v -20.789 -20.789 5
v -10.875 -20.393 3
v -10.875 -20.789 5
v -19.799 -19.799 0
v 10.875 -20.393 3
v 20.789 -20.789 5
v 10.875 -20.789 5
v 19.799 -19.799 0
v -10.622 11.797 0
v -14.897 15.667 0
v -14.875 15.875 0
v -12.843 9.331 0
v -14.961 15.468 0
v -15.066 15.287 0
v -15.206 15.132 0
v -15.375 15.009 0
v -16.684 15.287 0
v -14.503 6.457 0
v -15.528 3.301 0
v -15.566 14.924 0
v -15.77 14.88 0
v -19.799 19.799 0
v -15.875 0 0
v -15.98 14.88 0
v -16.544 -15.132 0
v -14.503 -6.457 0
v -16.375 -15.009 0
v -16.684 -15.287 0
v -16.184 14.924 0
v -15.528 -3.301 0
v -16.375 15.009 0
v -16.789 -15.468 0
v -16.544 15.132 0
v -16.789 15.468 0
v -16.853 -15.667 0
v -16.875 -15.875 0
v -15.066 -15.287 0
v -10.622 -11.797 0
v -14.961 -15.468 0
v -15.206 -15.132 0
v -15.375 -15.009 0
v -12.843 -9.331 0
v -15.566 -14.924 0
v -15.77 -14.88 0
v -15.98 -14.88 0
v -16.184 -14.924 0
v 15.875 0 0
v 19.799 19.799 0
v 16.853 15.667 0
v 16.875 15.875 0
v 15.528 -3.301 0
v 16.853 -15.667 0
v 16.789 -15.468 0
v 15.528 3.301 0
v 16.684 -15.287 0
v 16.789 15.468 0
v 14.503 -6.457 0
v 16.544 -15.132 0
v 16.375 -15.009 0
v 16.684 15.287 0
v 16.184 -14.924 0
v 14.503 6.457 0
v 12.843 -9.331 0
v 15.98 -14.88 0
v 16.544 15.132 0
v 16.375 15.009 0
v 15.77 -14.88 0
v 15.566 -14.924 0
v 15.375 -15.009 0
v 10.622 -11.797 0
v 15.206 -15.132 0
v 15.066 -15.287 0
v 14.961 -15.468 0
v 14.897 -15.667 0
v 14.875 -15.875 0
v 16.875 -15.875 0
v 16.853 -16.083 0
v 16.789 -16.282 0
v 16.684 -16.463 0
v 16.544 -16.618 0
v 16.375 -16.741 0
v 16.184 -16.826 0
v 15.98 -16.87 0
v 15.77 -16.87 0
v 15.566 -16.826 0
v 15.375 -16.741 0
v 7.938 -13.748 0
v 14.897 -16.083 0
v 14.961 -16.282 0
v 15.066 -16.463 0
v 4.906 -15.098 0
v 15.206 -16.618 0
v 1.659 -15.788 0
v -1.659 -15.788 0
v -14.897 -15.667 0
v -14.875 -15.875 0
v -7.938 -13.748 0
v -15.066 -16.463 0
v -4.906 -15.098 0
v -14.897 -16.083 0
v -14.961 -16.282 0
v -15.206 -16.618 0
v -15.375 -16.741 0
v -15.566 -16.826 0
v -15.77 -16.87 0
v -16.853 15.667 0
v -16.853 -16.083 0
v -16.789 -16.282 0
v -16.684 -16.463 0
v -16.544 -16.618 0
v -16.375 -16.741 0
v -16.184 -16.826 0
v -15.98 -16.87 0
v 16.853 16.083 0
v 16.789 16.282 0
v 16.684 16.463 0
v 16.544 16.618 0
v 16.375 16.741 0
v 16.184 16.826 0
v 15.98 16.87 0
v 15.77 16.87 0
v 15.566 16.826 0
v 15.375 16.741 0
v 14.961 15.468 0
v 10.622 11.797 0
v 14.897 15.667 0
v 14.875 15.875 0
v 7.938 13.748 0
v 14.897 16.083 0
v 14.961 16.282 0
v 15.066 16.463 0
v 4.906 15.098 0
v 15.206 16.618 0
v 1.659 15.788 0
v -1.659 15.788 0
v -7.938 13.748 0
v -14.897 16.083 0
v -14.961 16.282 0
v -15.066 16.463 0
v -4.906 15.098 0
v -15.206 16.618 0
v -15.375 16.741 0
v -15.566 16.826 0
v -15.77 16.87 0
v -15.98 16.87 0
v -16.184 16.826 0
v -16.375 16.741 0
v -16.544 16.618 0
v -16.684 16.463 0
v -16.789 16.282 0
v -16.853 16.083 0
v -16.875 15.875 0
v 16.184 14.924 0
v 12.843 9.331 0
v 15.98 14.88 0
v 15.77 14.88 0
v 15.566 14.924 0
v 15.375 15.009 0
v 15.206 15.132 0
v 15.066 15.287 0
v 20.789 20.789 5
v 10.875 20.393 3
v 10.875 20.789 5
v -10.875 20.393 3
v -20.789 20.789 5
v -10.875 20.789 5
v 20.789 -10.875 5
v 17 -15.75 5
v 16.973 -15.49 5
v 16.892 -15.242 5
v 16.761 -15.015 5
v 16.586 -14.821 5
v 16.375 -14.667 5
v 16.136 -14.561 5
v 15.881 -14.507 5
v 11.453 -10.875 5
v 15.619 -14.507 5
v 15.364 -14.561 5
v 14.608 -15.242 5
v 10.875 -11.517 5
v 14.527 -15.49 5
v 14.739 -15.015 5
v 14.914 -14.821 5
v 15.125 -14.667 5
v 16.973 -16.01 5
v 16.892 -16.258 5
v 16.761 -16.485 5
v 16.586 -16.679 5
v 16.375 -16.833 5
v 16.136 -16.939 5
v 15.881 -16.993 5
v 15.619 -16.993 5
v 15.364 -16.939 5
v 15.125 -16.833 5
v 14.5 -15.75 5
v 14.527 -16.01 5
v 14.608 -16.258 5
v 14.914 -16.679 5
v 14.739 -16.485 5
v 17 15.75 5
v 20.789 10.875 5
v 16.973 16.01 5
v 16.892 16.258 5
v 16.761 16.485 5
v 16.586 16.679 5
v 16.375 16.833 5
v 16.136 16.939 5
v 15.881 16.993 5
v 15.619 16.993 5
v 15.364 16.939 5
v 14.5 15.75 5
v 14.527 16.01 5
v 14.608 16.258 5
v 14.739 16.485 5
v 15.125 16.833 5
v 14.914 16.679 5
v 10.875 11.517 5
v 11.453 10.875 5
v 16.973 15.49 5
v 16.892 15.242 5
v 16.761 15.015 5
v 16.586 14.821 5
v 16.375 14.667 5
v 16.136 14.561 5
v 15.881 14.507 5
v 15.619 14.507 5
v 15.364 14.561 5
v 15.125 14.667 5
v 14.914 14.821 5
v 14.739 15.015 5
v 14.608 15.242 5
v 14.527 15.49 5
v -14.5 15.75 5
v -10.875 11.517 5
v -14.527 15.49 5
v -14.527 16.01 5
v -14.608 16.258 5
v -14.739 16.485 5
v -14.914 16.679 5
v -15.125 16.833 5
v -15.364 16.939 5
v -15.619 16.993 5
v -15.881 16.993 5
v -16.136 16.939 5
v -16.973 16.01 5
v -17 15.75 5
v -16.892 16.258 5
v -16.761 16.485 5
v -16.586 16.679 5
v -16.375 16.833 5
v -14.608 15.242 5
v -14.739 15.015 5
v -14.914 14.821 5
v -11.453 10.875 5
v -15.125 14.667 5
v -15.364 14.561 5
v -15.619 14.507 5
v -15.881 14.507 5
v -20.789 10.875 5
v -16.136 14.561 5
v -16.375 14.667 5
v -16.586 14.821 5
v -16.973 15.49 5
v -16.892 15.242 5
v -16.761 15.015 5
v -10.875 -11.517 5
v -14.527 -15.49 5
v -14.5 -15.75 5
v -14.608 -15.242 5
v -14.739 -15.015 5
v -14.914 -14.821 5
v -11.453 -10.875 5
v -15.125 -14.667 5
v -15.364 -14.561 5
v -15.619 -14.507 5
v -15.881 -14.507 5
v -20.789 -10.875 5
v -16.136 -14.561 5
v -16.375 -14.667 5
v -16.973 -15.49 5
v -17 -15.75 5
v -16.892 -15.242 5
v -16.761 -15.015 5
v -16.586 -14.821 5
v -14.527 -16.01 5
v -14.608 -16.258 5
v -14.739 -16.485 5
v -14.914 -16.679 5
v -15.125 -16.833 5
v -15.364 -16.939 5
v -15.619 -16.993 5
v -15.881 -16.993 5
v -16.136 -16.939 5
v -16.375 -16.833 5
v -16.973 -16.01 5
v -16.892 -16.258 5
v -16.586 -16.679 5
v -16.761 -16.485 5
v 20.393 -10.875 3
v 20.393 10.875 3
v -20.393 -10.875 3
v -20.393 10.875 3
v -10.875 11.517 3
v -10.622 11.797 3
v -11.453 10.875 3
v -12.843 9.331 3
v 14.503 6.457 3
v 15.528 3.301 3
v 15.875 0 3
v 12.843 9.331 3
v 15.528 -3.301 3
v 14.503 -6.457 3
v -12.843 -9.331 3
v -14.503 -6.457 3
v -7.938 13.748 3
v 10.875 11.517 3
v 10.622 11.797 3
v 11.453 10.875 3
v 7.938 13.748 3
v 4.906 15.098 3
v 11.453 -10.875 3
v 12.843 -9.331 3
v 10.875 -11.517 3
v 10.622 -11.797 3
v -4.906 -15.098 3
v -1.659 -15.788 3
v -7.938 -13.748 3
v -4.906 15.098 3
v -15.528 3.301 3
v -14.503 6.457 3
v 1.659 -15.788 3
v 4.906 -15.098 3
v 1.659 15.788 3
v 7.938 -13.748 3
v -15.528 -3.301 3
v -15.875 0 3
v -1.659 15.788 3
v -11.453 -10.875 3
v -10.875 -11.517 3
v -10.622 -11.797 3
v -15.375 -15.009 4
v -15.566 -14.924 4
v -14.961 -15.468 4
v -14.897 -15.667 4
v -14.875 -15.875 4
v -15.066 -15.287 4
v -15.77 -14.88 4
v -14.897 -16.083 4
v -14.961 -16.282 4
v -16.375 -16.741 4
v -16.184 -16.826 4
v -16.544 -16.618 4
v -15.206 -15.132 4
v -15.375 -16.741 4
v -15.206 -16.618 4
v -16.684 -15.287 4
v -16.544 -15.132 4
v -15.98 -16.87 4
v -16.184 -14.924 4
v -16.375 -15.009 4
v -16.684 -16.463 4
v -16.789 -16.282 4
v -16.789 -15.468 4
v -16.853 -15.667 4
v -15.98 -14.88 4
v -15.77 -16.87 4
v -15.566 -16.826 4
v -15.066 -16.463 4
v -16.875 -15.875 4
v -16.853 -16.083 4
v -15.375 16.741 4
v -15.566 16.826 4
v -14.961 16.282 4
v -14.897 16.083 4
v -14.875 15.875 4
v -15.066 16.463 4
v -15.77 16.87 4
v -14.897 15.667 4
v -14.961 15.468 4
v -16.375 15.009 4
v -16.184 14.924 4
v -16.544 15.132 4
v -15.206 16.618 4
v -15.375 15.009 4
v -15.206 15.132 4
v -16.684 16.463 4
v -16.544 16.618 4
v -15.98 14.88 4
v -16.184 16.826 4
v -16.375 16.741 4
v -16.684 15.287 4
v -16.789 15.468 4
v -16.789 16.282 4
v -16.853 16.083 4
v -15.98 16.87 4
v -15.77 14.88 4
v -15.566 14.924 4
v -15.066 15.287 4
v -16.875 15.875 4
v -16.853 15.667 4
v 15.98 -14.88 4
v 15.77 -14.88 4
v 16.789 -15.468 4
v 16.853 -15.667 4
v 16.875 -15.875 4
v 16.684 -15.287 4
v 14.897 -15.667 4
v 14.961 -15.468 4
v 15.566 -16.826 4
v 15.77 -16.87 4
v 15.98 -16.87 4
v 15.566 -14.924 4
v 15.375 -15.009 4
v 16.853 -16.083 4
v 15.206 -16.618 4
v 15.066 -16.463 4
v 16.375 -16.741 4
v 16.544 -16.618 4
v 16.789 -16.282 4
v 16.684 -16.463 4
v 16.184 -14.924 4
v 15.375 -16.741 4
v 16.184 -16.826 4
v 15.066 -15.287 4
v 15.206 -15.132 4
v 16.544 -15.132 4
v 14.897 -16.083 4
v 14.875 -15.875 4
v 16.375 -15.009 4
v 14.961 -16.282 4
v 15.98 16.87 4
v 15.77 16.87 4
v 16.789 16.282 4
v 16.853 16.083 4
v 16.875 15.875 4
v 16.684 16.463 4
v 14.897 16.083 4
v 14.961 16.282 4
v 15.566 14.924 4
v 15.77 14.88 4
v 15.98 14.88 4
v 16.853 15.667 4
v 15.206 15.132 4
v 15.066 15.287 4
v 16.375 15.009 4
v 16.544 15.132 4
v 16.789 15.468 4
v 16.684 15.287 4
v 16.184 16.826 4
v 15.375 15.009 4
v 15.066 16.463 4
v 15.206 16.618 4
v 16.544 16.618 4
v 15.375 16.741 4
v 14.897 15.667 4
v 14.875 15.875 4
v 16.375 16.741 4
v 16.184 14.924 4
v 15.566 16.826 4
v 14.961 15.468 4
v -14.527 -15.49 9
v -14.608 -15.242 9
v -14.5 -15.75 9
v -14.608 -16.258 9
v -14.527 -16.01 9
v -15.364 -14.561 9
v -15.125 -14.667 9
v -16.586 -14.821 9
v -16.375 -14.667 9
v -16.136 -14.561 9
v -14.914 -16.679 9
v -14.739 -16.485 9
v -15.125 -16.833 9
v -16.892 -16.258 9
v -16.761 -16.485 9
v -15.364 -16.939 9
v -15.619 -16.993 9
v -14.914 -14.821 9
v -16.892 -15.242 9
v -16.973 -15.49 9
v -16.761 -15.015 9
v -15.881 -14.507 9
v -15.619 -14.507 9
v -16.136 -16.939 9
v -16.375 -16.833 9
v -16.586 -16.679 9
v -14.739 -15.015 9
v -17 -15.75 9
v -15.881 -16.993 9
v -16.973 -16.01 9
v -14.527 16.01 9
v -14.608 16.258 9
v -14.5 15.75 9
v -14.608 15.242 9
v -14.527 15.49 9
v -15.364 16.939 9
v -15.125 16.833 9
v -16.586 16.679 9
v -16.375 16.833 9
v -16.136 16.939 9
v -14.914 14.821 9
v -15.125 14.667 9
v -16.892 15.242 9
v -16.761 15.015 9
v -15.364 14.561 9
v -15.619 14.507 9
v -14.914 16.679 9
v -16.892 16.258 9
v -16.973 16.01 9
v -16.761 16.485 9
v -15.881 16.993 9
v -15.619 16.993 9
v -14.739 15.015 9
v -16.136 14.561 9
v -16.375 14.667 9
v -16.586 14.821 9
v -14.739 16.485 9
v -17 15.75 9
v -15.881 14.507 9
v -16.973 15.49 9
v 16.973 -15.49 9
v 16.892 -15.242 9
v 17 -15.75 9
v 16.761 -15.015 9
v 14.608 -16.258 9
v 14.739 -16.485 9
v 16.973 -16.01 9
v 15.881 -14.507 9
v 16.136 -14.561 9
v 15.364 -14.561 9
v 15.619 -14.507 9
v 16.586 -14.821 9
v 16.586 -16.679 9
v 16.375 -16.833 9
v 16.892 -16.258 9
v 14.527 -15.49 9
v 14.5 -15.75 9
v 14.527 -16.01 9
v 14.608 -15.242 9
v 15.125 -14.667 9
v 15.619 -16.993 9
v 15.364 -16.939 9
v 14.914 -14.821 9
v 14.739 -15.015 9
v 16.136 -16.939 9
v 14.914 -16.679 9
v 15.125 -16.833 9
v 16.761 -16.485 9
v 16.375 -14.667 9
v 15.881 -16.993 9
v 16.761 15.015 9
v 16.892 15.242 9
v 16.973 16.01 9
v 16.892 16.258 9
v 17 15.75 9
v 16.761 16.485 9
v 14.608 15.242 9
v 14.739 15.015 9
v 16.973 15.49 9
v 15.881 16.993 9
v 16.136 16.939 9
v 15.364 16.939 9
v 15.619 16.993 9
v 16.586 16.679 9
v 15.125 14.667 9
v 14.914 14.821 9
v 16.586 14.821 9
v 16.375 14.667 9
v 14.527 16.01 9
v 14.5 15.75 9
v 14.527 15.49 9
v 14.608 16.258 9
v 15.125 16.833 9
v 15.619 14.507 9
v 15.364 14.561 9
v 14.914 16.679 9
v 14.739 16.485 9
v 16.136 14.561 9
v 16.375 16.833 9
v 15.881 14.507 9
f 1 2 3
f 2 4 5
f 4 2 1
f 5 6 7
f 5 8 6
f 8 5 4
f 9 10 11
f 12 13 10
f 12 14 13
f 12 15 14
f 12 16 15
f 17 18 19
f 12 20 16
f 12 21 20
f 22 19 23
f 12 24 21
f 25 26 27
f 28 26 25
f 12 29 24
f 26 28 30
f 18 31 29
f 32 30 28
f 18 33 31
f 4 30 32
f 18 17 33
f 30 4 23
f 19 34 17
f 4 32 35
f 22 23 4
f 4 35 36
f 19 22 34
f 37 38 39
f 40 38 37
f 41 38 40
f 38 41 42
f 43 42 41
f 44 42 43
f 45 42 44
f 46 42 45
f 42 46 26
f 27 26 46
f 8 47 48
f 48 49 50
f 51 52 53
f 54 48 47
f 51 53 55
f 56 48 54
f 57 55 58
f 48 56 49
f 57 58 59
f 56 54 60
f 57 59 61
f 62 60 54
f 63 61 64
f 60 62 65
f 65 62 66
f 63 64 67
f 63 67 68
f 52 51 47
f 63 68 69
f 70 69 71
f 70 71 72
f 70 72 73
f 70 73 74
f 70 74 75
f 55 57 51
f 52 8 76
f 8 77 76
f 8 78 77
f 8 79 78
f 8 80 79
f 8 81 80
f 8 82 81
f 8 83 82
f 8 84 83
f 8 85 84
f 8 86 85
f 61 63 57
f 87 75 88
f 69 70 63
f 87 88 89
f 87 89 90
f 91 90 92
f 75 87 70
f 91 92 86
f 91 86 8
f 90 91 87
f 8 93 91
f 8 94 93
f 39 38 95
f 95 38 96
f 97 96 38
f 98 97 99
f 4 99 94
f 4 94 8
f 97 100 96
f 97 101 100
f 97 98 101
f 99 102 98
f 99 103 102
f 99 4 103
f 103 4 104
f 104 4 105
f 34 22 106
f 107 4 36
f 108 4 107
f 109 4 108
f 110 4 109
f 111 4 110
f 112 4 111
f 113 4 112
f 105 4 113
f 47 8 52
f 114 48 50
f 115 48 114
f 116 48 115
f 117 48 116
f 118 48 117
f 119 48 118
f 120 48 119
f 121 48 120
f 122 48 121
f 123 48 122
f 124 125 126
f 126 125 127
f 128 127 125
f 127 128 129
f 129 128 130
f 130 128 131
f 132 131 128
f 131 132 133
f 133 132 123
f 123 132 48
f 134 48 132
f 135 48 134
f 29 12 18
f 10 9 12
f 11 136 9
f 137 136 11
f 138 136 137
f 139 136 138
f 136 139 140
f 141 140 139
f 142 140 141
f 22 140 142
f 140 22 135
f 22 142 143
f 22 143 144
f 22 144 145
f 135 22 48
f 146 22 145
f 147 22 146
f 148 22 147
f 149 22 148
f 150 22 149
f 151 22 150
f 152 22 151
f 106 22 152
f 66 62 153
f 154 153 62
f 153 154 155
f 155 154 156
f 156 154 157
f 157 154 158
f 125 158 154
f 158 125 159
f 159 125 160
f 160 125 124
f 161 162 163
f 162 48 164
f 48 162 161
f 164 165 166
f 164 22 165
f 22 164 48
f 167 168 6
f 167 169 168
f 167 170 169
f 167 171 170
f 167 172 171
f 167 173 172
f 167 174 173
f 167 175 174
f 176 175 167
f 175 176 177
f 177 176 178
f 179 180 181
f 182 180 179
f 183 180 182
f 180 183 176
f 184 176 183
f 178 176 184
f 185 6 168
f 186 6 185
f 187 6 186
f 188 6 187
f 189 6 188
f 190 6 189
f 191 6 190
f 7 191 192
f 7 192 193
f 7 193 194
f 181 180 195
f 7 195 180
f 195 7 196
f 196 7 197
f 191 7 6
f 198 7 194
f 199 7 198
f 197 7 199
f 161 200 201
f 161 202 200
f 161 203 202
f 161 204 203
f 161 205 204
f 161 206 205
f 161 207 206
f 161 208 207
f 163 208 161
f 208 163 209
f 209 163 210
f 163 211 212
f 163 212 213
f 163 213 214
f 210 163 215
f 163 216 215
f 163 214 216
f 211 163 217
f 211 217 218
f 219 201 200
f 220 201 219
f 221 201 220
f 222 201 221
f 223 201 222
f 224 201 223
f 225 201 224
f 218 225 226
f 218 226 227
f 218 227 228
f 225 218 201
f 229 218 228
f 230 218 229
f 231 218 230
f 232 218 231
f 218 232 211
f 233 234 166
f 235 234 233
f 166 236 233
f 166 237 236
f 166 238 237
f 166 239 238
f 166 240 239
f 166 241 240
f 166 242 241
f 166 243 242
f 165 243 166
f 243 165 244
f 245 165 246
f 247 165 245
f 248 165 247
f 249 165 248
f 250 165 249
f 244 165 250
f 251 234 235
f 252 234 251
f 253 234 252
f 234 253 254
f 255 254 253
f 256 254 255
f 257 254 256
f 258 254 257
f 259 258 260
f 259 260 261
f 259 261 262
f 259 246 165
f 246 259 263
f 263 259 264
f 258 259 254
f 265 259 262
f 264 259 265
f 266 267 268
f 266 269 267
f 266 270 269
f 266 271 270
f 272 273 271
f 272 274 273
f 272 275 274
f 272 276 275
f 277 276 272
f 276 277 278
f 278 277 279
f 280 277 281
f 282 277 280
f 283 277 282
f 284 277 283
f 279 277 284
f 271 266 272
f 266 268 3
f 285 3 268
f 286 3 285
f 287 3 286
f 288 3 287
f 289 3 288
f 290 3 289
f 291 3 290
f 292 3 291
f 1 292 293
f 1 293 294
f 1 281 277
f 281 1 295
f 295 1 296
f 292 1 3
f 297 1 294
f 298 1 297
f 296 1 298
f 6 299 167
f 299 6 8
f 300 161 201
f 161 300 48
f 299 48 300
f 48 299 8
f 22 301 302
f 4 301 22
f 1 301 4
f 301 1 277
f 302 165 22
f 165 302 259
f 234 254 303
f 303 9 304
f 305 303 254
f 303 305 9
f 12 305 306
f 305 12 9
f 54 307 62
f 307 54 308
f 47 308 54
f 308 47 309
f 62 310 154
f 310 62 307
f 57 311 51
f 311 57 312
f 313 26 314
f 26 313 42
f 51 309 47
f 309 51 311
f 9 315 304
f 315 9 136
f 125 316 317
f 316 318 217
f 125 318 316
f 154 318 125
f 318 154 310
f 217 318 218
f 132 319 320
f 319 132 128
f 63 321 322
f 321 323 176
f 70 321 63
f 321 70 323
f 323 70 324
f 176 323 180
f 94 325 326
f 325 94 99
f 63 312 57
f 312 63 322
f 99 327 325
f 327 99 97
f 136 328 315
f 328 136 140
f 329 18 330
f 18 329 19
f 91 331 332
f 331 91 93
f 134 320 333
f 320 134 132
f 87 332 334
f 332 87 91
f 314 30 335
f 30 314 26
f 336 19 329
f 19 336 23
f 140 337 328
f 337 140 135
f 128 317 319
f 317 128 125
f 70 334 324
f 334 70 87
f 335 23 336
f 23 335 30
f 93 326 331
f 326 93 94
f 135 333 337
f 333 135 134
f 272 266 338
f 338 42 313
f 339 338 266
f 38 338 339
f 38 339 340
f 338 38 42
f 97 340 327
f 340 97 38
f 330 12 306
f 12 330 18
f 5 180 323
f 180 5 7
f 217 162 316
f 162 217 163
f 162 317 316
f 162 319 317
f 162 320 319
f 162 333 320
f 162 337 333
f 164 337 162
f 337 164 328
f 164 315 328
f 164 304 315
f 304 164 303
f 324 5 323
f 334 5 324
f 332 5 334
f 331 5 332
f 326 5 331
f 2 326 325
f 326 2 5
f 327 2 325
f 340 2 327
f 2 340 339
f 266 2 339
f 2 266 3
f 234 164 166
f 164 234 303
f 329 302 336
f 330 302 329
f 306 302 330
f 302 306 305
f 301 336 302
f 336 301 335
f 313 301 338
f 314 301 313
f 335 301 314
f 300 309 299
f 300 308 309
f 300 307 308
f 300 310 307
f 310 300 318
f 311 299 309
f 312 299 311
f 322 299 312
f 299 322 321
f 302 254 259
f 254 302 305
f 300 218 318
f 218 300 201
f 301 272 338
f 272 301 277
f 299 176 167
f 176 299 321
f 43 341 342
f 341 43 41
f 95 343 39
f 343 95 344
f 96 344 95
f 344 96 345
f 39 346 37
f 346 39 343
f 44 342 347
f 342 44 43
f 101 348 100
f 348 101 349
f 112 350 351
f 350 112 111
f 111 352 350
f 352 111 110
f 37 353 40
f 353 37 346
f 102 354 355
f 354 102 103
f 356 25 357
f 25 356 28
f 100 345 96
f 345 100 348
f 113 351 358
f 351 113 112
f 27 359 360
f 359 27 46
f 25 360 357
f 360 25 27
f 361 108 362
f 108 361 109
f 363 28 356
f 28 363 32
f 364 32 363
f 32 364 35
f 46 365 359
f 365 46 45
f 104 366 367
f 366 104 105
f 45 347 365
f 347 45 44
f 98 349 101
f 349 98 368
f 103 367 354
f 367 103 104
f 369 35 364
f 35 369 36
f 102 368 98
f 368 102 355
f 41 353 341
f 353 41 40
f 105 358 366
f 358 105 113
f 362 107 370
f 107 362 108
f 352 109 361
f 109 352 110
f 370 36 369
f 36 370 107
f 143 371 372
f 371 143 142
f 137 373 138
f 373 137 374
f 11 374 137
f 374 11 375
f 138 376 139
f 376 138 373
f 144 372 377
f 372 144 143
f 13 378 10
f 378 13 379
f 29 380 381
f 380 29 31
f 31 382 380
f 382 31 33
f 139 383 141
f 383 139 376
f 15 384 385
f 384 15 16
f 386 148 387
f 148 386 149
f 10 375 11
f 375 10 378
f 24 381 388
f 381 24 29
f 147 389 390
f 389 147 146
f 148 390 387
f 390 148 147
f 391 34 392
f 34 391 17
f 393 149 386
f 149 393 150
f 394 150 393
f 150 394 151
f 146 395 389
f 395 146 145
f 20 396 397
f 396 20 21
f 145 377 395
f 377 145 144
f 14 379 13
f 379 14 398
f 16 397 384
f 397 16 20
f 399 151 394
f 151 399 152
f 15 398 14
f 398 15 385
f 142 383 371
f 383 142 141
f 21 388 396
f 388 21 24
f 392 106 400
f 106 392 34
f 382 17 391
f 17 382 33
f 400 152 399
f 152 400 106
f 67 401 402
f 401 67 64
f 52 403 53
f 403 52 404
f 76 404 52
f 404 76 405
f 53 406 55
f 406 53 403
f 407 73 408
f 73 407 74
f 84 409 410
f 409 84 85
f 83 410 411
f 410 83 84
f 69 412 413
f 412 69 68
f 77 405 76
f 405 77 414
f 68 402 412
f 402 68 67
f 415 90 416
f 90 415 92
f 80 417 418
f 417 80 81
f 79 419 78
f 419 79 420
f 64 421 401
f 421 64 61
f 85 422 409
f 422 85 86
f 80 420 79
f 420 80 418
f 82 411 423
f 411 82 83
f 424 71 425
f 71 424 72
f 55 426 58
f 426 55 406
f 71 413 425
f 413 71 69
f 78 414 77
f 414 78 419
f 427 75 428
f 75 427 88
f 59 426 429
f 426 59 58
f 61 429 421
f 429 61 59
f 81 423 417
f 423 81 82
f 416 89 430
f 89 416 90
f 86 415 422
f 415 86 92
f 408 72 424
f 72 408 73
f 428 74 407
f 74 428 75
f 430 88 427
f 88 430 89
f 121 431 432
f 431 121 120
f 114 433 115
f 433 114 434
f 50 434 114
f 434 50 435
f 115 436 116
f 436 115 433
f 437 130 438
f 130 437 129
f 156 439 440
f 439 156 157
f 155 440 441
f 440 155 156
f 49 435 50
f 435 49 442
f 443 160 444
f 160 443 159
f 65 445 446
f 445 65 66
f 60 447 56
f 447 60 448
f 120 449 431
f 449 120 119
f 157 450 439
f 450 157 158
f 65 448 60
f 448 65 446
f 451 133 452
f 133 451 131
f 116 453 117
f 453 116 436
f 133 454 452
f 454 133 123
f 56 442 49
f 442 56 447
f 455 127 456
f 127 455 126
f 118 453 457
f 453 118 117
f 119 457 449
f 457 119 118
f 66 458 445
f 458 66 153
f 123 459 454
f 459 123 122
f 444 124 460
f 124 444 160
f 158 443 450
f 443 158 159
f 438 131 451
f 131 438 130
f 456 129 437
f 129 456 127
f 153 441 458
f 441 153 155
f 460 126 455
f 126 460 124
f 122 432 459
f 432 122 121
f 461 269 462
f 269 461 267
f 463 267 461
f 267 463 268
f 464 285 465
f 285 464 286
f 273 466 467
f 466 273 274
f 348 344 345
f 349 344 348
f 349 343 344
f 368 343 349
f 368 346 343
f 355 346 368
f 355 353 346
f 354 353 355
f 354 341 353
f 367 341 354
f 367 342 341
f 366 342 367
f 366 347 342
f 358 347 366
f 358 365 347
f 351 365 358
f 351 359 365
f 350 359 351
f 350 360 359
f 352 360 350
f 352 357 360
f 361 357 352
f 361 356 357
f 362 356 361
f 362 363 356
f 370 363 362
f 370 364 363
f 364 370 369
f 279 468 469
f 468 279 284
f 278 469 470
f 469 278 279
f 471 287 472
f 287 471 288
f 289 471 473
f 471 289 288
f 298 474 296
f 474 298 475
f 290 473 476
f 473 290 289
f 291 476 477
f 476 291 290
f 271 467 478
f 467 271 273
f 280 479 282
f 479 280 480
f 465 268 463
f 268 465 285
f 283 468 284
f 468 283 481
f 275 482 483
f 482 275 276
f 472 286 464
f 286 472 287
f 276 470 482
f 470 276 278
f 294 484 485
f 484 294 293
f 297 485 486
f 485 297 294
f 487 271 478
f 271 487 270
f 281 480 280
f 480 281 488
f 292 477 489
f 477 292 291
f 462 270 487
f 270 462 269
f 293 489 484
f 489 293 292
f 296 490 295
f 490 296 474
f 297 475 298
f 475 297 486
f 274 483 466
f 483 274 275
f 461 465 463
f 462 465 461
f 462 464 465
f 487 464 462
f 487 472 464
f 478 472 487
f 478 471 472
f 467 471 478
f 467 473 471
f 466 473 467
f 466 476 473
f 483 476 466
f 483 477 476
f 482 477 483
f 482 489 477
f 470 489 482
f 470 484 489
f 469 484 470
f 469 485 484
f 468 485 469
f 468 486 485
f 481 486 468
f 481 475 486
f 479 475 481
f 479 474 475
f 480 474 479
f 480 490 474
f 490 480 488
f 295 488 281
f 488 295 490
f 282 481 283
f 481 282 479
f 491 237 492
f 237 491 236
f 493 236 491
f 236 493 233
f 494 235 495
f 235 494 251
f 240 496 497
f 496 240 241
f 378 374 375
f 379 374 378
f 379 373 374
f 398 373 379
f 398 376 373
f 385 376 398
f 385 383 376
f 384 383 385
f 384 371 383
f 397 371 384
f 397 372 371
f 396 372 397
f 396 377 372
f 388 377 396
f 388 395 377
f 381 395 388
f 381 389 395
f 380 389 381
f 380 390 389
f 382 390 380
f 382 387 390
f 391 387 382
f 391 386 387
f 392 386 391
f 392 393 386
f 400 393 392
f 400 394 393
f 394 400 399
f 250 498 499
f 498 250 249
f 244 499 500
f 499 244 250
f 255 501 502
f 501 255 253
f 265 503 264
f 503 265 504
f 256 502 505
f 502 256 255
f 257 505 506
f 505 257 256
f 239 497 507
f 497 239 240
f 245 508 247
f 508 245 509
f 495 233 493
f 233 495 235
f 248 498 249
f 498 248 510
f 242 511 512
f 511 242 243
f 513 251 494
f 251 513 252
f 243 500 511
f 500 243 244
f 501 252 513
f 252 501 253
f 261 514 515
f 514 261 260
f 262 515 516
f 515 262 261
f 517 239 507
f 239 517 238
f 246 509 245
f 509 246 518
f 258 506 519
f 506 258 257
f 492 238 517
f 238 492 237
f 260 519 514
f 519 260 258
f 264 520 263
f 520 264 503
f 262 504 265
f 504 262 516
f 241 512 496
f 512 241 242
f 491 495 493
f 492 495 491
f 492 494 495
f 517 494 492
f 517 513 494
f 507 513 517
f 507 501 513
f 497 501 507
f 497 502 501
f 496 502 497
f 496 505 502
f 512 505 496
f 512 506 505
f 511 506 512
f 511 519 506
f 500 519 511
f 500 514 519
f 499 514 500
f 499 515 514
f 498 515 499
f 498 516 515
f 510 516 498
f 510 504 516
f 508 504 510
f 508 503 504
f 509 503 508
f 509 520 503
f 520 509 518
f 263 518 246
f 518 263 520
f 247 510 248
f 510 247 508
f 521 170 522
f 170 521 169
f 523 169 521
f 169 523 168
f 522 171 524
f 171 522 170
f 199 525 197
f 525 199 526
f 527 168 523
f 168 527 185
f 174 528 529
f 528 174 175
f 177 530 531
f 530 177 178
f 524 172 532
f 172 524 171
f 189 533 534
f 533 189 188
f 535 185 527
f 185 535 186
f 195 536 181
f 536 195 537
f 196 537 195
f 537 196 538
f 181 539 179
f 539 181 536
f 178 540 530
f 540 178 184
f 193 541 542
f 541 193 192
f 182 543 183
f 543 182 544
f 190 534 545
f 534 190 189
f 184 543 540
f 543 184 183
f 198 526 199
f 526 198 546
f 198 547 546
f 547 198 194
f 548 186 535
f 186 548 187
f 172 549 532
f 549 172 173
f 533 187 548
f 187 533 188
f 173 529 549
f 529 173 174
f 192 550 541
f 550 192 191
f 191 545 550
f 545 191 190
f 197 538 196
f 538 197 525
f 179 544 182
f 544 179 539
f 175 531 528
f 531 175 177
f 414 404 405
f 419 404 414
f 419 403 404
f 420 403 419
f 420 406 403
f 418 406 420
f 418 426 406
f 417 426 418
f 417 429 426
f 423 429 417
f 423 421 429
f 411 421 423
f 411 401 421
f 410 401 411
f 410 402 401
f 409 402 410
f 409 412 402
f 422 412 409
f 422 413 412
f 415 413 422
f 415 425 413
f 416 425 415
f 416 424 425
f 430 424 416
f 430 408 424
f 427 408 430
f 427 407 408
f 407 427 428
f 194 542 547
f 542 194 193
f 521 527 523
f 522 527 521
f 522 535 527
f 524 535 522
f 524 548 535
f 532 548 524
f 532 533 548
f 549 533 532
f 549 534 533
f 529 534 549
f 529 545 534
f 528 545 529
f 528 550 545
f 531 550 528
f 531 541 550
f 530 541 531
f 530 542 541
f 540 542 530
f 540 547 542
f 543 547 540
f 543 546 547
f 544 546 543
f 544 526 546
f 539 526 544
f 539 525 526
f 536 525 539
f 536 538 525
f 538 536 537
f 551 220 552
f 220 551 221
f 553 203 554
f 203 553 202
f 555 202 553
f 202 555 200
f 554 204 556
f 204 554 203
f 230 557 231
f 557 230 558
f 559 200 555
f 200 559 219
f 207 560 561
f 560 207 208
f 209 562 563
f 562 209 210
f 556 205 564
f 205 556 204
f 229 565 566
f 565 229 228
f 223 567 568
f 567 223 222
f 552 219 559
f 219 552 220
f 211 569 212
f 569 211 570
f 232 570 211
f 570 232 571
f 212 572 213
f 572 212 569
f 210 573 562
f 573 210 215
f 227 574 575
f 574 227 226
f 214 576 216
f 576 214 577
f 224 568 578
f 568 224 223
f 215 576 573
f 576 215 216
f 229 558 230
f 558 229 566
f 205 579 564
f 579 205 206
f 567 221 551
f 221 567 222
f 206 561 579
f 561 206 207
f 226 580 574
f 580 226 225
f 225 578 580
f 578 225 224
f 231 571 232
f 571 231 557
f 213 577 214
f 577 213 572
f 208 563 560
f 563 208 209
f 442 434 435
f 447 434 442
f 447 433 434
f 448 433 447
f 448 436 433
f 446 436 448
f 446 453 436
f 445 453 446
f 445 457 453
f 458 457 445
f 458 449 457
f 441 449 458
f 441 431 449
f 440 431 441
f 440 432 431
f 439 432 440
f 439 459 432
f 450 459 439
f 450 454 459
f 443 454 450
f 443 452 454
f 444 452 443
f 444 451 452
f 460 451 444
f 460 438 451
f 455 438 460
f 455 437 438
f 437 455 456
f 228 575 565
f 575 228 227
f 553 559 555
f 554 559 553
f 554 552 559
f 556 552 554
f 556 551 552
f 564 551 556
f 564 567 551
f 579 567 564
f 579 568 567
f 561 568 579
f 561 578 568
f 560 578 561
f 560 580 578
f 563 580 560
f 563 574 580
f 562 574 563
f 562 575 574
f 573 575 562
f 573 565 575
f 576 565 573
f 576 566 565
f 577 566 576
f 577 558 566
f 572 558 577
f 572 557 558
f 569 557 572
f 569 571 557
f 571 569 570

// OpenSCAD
/**
 *  Fan parameters
 */
FAN_WIDTH = 40;
FAN_HOLE_WIDTH = 31.75;
FAN_DIAMETER = 31.75;
FAN_SCREW_DIAMETER = 2;

/**
 *  Motor parameters
 */
MOTOR_WIDTH = 42;
MOTOR_HOLE_WIDTH = 31.5;
MOTOR_SCREW_DIAMETER = 2.5;

AERATION = FAN_DIAMETER - 10;

HEIGHT = 5;
ADJUST = 1.4;

$fn = 30;

module ultimaker_fan_support() {

    // Fan
    % translate([0, 0, -5]) cube(size = [FAN_WIDTH, FAN_WIDTH, 10], center = true);

    // Motor
    % translate([0, 0, HEIGHT + 40 / 2]) cube(size = [MOTOR_WIDTH, MOTOR_WIDTH, 40], center = true);

    difference() {
        rotate([0, 0, 45]) {
            cylinder(r1 = FAN_WIDTH / 2 * ADJUST, r2 = MOTOR_WIDTH / 2 * ADJUST, h = HEIGHT, $fn = 4);
        }

        cylinder(r = FAN_DIAMETER / 2, HEIGHT * 4, center = true);
       
        // Aeration X
        translate([0, 0, HEIGHT]) {
            cube(size = [AERATION, MOTOR_WIDTH * 2, 4], center = true);
        }

        // Aeration Y
        translate([0, 0, HEIGHT]) {
            cube(size = [MOTOR_WIDTH * 2, AERATION, 4], center = true);
        }

        // Hole
        translate([- FAN_HOLE_WIDTH / 2, - FAN_HOLE_WIDTH / 2, -10]) {
            cylinder(r = FAN_SCREW_DIAMETER / 2, h = 100);
        }

        translate([- FAN_HOLE_WIDTH / 2, FAN_HOLE_WIDTH / 2, -10]) {
            cylinder(r = FAN_SCREW_DIAMETER / 2, h = 100);
        }

        translate([FAN_HOLE_WIDTH / 2, - FAN_HOLE_WIDTH / 2, -10]) {
            cylinder(r = FAN_SCREW_DIAMETER / 2, h = 100);
        }

        translate([FAN_HOLE_WIDTH / 2, FAN_HOLE_WIDTH / 2, -10]) {
            cylinder(r = FAN_SCREW_DIAMETER / 2, h = 100);
        }
    }

    translate([0, 0, HEIGHT]) {
        // Hole
        translate([- MOTOR_HOLE_WIDTH / 2, - MOTOR_HOLE_WIDTH / 2, -1]) {
            cylinder(r = MOTOR_SCREW_DIAMETER / 2, h = 5);
        }

        translate([- MOTOR_HOLE_WIDTH / 2, MOTOR_HOLE_WIDTH / 2, -1]) {
            cylinder(r = MOTOR_SCREW_DIAMETER / 2, h = 5);
        }

        translate([MOTOR_HOLE_WIDTH / 2, - MOTOR_HOLE_WIDTH / 2, -1]) {
            cylinder(r = MOTOR_SCREW_DIAMETER / 2, h = 5);
        }

        translate([MOTOR_HOLE_WIDTH / 2, MOTOR_HOLE_WIDTH / 2, -1]) {
            cylinder(r = MOTOR_SCREW_DIAMETER / 2, h = 5);
        }
    }
}

ultimaker_fan_support();
